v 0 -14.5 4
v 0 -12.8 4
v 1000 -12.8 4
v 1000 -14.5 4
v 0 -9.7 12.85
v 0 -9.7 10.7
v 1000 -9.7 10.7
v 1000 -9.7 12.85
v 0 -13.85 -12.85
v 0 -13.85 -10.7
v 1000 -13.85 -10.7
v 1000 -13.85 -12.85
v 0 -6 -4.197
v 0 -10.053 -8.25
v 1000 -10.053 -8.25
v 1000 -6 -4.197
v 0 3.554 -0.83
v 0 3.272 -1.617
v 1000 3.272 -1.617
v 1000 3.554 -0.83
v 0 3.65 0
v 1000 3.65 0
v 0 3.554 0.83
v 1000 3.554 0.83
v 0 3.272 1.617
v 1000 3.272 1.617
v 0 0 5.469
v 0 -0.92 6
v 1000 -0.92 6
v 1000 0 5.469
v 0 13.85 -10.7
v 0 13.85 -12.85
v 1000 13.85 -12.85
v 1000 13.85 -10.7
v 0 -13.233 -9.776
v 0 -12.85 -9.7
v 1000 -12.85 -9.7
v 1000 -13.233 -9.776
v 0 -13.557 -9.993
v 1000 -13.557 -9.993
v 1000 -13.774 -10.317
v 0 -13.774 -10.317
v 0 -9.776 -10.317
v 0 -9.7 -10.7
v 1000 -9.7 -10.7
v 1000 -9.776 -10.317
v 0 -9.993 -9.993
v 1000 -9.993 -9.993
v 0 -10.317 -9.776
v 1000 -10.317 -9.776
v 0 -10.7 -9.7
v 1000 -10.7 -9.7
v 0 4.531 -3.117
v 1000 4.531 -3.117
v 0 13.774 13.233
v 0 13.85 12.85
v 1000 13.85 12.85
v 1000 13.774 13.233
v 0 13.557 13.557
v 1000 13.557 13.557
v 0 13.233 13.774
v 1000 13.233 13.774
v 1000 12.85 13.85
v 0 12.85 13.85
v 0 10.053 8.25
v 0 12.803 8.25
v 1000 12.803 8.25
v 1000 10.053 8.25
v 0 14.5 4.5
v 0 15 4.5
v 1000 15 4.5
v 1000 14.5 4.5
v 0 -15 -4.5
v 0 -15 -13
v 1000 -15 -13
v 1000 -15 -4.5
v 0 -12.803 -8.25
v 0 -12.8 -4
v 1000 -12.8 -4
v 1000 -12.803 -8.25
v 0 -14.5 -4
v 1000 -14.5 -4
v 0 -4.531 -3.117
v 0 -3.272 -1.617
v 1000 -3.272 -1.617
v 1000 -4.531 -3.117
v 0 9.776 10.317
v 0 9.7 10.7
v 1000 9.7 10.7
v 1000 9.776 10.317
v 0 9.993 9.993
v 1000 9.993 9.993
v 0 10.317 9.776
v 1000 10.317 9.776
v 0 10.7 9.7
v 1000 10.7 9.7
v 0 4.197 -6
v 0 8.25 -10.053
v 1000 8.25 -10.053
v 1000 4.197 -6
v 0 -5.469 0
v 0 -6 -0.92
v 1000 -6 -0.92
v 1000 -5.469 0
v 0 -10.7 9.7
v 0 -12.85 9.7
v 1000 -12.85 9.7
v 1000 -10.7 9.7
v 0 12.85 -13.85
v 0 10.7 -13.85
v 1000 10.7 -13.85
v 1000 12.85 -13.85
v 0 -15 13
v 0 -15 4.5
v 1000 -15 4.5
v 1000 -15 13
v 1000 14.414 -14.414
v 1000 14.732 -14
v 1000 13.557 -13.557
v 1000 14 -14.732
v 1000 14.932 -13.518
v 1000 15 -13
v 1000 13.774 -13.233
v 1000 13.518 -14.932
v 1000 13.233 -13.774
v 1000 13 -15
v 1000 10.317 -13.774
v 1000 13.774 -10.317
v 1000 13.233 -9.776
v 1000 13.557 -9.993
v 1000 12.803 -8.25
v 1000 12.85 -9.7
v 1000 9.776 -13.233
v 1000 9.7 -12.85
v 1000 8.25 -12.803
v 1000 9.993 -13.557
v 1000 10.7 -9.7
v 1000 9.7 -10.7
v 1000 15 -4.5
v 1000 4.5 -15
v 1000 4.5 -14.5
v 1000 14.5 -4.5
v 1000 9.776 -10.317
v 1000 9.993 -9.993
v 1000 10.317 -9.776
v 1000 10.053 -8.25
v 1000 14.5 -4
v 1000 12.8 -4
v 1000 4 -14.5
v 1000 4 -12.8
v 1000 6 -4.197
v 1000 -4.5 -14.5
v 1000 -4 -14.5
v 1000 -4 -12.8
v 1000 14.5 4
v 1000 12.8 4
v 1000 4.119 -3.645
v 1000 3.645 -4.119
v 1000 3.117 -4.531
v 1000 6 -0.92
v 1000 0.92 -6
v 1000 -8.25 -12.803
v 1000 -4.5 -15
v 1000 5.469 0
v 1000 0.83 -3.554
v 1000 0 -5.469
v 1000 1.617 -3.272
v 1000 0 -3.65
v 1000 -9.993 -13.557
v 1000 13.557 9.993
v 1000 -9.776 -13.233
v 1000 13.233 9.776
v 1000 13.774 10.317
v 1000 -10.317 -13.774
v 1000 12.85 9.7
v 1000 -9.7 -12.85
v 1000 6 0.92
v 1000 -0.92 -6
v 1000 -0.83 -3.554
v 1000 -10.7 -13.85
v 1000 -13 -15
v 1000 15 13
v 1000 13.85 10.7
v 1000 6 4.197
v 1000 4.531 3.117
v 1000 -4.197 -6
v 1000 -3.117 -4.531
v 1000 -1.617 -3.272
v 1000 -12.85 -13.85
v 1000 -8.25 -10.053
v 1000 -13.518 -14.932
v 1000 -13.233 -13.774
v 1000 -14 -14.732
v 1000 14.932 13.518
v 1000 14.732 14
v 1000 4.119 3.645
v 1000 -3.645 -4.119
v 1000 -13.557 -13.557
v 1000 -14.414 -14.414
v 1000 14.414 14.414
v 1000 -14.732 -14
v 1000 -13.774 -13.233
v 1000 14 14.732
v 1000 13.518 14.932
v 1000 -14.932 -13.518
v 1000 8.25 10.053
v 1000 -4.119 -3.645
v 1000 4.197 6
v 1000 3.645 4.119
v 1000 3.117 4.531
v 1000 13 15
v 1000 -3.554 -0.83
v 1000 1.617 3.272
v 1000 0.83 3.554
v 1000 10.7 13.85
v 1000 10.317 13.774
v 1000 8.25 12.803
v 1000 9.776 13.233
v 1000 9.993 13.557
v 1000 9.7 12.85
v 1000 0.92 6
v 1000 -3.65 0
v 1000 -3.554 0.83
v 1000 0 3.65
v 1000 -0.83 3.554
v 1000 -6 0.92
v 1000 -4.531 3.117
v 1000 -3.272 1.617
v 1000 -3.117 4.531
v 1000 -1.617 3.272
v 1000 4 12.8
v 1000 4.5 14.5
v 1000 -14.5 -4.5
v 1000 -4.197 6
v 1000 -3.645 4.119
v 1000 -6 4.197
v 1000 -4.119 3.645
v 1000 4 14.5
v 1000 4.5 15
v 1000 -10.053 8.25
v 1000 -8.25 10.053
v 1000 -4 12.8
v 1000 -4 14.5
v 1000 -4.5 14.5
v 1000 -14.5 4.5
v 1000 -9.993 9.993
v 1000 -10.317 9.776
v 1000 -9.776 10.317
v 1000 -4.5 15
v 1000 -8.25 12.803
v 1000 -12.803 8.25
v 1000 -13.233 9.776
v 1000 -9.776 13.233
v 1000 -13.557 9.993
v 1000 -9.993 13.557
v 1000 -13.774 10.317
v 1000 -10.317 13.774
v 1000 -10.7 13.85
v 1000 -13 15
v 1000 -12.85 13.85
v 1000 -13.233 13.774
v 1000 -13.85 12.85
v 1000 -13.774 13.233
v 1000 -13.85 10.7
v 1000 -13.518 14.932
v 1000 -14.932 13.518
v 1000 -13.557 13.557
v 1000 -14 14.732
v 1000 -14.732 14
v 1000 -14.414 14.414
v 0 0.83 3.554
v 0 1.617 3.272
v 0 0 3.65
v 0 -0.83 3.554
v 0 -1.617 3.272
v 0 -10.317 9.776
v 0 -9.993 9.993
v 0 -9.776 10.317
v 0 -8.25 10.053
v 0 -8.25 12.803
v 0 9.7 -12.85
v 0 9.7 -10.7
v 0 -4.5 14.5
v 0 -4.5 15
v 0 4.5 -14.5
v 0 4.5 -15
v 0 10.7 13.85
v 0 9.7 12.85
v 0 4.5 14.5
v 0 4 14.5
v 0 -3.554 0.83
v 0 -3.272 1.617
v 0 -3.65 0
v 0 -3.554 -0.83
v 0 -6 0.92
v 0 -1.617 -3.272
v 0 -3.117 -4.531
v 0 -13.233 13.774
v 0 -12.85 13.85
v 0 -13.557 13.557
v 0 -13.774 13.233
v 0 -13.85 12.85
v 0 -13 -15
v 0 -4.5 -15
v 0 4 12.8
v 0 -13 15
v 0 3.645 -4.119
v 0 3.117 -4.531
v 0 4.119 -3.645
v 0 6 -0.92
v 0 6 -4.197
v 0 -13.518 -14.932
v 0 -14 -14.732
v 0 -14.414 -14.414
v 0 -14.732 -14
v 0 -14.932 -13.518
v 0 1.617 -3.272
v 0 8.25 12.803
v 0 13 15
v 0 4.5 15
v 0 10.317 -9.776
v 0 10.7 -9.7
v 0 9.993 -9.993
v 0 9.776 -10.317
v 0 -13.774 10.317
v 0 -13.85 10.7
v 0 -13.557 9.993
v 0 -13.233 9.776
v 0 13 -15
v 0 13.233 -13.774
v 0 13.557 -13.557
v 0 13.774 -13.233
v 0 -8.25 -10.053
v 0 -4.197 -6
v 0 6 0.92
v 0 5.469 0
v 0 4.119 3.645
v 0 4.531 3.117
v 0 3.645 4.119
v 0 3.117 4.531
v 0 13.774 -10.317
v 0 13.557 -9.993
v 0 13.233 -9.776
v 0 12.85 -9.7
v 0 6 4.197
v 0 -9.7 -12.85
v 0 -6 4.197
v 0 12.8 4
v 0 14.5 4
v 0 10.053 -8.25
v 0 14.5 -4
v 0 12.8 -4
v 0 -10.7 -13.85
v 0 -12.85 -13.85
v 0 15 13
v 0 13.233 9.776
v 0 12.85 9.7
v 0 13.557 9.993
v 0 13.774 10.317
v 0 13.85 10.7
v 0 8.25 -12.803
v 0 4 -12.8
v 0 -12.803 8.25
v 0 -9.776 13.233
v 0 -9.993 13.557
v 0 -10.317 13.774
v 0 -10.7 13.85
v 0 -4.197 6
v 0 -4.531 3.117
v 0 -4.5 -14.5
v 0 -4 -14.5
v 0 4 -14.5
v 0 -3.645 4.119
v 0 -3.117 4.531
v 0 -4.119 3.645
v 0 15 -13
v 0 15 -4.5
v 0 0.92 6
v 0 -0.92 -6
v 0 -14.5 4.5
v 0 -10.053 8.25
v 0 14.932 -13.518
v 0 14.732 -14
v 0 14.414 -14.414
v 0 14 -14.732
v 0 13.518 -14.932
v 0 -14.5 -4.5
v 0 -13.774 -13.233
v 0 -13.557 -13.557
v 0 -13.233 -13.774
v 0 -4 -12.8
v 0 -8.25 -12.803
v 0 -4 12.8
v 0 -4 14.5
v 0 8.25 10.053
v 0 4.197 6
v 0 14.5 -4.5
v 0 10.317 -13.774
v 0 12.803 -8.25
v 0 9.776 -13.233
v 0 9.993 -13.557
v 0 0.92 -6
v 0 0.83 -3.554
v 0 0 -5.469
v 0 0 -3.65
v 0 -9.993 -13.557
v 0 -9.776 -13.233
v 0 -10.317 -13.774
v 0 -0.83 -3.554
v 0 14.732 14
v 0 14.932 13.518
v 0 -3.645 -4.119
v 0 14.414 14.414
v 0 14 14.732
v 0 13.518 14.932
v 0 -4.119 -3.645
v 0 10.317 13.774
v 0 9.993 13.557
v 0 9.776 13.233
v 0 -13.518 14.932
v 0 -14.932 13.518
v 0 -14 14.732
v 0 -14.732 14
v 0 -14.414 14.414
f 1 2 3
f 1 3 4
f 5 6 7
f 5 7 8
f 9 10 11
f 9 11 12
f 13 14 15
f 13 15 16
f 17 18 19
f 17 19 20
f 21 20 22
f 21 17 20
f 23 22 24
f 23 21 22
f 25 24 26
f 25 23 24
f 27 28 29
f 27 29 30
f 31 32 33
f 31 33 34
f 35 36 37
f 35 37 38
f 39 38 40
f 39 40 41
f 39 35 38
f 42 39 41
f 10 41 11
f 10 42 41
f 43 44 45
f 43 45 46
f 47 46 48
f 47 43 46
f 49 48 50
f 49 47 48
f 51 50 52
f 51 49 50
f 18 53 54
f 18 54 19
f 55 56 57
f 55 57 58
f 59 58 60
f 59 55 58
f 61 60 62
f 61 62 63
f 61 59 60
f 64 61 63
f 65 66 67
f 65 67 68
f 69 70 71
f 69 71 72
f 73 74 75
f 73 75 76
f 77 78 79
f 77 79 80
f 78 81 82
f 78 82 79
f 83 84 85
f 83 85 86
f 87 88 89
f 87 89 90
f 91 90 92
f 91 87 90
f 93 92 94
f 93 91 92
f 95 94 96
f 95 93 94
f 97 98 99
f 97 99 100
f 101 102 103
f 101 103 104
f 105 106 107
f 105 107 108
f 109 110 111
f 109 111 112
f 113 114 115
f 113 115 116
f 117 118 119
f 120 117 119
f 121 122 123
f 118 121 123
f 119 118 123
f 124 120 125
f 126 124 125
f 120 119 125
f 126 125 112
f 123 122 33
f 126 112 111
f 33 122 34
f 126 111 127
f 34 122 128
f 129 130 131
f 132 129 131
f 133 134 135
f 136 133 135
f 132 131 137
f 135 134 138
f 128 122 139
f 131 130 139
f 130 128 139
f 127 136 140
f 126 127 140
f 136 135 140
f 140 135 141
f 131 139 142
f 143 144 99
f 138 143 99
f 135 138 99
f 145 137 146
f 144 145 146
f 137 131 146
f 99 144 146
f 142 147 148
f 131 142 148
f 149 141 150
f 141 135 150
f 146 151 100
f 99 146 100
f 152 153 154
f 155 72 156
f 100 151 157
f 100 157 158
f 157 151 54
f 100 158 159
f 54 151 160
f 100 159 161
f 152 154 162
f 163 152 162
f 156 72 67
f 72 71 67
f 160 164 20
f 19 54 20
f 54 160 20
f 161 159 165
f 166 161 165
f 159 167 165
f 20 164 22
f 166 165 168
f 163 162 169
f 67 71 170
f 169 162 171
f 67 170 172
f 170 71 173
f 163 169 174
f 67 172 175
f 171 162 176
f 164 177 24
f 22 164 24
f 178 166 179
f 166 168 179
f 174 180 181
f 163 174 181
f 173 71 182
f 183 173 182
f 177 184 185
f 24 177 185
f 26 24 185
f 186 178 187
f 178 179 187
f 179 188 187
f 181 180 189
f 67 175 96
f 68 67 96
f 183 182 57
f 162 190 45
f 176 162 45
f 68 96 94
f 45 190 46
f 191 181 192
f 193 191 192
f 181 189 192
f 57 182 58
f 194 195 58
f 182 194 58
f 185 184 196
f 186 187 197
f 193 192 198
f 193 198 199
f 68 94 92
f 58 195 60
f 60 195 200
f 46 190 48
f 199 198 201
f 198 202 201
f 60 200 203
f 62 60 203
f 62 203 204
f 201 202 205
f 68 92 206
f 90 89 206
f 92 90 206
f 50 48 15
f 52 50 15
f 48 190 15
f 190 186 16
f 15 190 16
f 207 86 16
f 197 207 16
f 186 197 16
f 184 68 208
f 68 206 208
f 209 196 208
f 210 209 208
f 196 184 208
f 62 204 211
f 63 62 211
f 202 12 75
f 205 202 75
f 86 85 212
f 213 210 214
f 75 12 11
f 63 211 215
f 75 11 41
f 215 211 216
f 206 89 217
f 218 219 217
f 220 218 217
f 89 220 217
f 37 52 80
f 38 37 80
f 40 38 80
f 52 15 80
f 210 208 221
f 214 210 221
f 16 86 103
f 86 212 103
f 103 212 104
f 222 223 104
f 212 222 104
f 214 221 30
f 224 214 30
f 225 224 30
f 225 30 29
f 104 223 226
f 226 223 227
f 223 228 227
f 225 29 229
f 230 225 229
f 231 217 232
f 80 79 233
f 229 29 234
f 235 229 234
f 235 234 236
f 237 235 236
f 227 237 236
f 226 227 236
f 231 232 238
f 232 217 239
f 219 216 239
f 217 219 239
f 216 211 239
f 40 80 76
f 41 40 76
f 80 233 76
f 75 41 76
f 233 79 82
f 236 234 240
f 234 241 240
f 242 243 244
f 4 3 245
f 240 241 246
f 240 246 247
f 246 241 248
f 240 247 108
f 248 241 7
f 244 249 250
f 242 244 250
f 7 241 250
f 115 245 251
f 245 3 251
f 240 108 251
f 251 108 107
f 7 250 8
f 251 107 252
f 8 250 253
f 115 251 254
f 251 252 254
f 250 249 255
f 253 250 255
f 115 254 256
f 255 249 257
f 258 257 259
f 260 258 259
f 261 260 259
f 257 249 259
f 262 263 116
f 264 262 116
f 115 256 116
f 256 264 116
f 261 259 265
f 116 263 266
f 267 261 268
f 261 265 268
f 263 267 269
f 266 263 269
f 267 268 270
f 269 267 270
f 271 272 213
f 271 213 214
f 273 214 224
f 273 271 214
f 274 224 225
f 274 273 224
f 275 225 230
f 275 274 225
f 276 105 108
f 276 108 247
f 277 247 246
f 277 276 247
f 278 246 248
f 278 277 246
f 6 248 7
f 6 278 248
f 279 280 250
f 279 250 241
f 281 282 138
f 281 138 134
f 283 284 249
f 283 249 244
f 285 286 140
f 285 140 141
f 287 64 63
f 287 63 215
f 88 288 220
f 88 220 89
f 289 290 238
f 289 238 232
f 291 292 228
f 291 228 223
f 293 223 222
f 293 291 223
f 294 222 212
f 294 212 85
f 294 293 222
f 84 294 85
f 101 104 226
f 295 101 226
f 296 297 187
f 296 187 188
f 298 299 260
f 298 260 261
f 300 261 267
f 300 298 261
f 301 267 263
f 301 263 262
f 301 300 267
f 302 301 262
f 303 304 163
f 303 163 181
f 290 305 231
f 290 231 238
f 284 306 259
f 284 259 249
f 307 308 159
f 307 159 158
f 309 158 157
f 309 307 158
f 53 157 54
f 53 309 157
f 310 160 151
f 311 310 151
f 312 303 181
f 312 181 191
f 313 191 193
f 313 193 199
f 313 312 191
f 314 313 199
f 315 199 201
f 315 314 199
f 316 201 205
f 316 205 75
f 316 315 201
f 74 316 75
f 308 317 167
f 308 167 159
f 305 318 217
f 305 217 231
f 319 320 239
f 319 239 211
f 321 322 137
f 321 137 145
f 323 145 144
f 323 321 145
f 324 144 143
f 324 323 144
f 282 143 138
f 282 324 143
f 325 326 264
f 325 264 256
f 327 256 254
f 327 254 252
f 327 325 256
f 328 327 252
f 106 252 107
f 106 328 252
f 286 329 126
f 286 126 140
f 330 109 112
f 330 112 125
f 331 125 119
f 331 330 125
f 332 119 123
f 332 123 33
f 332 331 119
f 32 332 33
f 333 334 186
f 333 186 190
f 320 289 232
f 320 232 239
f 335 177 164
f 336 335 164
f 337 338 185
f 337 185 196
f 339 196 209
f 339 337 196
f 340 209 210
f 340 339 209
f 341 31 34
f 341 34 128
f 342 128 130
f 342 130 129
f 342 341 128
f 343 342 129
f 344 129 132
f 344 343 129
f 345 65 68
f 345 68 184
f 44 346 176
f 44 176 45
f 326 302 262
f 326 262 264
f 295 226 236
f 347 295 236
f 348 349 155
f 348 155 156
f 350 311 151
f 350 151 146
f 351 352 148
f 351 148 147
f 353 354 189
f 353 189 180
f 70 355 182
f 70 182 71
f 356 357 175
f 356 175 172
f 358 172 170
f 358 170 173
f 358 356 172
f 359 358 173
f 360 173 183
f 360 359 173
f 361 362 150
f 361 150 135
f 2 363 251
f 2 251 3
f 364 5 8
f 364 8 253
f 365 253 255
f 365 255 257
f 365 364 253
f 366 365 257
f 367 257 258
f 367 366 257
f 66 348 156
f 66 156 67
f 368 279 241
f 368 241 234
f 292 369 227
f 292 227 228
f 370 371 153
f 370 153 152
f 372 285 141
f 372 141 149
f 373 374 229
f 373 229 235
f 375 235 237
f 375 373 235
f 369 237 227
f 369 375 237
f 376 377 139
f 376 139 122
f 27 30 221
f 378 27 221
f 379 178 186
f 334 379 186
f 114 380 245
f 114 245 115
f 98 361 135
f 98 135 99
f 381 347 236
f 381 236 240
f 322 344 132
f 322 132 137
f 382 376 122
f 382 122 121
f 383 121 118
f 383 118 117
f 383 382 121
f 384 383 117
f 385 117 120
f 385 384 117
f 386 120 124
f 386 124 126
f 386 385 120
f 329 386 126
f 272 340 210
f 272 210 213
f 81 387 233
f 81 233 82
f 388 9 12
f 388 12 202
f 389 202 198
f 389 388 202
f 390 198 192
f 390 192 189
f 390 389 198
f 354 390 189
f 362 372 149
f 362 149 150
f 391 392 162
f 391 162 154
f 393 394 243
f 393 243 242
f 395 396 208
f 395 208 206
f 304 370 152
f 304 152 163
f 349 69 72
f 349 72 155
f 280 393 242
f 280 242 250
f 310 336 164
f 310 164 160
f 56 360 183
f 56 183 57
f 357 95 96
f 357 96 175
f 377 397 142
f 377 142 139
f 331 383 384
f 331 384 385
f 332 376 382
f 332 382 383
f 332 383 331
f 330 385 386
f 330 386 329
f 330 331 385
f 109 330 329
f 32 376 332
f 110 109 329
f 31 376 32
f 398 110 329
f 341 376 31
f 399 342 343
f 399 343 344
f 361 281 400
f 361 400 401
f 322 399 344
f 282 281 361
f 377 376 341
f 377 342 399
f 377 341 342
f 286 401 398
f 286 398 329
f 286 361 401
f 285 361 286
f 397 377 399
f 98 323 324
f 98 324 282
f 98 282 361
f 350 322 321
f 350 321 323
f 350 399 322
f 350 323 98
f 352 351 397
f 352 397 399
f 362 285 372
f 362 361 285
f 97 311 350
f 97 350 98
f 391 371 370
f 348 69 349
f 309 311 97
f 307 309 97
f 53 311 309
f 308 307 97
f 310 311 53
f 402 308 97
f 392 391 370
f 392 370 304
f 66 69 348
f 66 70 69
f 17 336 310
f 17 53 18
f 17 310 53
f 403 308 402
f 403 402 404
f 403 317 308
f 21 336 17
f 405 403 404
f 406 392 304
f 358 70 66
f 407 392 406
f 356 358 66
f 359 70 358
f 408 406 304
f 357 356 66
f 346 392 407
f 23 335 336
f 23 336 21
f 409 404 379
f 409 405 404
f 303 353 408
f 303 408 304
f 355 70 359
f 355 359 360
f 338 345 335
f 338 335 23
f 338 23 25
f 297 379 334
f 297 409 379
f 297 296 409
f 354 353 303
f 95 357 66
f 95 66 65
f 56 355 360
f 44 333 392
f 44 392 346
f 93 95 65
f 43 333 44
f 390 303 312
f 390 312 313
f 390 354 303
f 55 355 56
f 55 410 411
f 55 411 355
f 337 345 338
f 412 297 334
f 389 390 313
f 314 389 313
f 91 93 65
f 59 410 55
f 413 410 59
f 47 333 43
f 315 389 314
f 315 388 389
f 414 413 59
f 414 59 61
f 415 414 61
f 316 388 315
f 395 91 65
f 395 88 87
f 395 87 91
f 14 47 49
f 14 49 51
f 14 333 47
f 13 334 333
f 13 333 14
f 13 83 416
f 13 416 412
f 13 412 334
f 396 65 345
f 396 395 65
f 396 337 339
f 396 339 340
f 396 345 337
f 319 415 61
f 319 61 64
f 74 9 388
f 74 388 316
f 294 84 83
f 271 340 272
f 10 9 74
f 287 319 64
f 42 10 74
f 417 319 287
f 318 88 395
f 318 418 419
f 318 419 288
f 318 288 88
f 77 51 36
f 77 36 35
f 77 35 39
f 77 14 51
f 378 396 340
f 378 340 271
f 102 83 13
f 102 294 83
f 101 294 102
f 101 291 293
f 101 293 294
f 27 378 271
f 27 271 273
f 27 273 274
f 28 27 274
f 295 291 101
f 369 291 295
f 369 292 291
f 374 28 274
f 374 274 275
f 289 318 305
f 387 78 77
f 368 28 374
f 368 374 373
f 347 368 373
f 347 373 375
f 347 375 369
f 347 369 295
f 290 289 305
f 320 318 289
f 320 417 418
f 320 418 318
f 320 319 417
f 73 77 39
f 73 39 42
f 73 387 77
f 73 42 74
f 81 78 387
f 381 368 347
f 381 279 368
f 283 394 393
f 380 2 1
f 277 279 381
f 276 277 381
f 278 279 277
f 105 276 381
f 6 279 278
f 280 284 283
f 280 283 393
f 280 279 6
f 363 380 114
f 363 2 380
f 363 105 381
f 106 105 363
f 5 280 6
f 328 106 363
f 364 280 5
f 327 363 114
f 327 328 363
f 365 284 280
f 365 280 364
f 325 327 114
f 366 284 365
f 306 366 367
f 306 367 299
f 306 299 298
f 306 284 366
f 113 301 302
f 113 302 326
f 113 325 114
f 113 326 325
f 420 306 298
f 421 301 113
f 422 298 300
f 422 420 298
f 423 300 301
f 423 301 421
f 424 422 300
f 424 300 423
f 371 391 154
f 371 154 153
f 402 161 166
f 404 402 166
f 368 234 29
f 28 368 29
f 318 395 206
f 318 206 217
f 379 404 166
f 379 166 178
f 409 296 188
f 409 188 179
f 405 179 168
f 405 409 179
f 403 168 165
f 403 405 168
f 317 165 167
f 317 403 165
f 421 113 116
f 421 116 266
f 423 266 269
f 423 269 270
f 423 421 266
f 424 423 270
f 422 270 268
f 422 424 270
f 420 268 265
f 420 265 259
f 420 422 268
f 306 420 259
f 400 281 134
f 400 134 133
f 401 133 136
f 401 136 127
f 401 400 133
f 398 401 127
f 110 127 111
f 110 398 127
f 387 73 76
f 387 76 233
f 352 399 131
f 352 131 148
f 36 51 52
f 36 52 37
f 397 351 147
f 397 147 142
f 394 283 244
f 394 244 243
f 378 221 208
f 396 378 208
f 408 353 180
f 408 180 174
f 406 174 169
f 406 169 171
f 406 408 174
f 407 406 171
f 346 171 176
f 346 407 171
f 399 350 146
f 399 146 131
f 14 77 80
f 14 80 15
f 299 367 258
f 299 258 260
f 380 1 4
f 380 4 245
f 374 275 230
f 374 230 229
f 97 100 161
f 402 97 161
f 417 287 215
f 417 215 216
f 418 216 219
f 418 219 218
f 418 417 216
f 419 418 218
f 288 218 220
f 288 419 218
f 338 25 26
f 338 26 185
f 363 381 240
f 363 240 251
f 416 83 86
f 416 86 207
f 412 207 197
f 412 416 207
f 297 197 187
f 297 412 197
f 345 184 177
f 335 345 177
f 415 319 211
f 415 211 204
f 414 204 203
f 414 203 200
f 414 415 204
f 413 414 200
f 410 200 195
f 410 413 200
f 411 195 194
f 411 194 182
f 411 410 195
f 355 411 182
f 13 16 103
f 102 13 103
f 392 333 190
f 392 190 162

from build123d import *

# Parameters (mm, degrees)
ESTRUSIONE_ESTRUSIONE1_DEPTH = 1000


with BuildPart() as part:
    # Schizzo1 → Estrusione-Estrusione1 (new body)
    with BuildSketch(Plane(origin=(0, 0, 0), x_dir=(0, -1, 0), z_dir=(-1, 0, 0))):
        with BuildLine():
            Line((-10.05312229, 8.25), (-6, 4.19687771))
            Line((-6, 4.19687771), (-6, 0.91961524))
            Line((-6, 0.91961524), (-5.469059893, -2e-09))
            Line((-5.469059893, -2e-09), (-6, -0.91961524))
            Line((-6, -0.91961524), (-6, -4.19687771))
            Line((-6, -4.19687771), (-10.05312229, -8.25))
            Line((-10.05312229, -8.25), (-12.80312305, -8.25))
            Line((-12.80312305, -8.25), (-12.8, -4))
            Line((-12.8, -4), (-14.5, -4))
            Line((-14.5, -4), (-14.5, -4.5))
            Line((-14.5, -4.5), (-15, -4.5))
            Line((-15, -4.5), (-15, -13))
            ThreePointArc((-15, -13), (-14.414213562, -14.414213562), (-13, -15))
            Line((-13, -15), (-4.5, -15))
            Line((-4.5, -15), (-4.5, -14.5))
            Line((-4.5, -14.5), (-4, -14.5))
            Line((-4, -14.5), (-4, -12.8))
            Line((-4, -12.8), (-8.25, -12.80312305))
            Line((-8.25, -12.80312305), (-8.25, -10.05312229))
            Line((-8.25, -10.05312229), (-4.19687771, -6))
            Line((-4.19687771, -6), (-0.91961524, -6))
            Line((-0.91961524, -6), (2e-09, -5.469059893))
            Line((2e-09, -5.469059893), (0.91961524, -6))
            Line((0.91961524, -6), (4.19687771, -6))
            Line((4.19687771, -6), (8.25, -10.05312229))
            Line((8.25, -10.05312229), (8.25, -12.80312305))
            Line((8.25, -12.80312305), (4, -12.8))
            Line((4, -12.8), (4, -14.5))
            Line((4, -14.5), (4.5, -14.5))
            Line((4.5, -14.5), (4.5, -15))
            Line((4.5, -15), (13, -15))
            ThreePointArc((13, -15), (14.414213562, -14.414213562), (15, -13))
            Line((15, -13), (15, -4.5))
            Line((15, -4.5), (14.5, -4.5))
            Line((14.5, -4.5), (14.5, -4))
            Line((14.5, -4), (12.8, -4))
            Line((12.8, -4), (12.80312305, -8.25))
            Line((12.80312305, -8.25), (10.05312229, -8.25))
            Line((10.05312229, -8.25), (6, -4.19687771))
            Line((6, -4.19687771), (6, -0.91961524))
            Line((6, -0.91961524), (5.469059893, -2e-09))
            Line((5.469059893, -2e-09), (6, 0.91961524))
            Line((6, 0.91961524), (6, 4.19687771))
            Line((6, 4.19687771), (10.05312229, 8.25))
            Line((10.05312229, 8.25), (12.80312305, 8.25))
            Line((12.80312305, 8.25), (12.8, 4))
            Line((12.8, 4), (14.5, 4))
            Line((14.5, 4), (14.5, 4.5))
            Line((14.5, 4.5), (15, 4.5))
            Line((15, 4.5), (15, 13))
            ThreePointArc((15, 13), (14.414213562, 14.414213562), (13, 15))
            Line((13, 15), (4.5, 15))
            Line((4.5, 15), (4.5, 14.5))
            Line((4.5, 14.5), (4, 14.5))
            Line((4, 14.5), (4, 12.8))
            Line((4, 12.8), (8.25, 12.80312305))
            Line((8.25, 12.80312305), (8.25, 10.05312229))
            Line((8.25, 10.05312229), (4.19687771, 6))
            Line((4.19687771, 6), (0.91961524, 6))
            Line((0.91961524, 6), (2e-09, 5.469059893))
            Line((2e-09, 5.469059893), (-0.91961524, 6))
            Line((-0.91961524, 6), (-4.19687771, 6))
            Line((-4.19687771, 6), (-8.25, 10.05312229))
            Line((-8.25, 10.05312229), (-8.25, 12.80312305))
            Line((-8.25, 12.80312305), (-4, 12.8))
            Line((-4, 12.8), (-4, 14.5))
            Line((-4, 14.5), (-4.5, 14.5))
            Line((-4.5, 14.5), (-4.5, 15))
            Line((-4.5, 15), (-13, 15))
            ThreePointArc((-13, 15), (-14.414213562, 14.414213562), (-15, 13))
            Line((-15, 13), (-15, 4.5))
            Line((-15, 4.5), (-14.5, 4.5))
            Line((-14.5, 4.5), (-14.5, 4))
            Line((-14.5, 4), (-12.8, 4))
            Line((-12.8, 4), (-12.80312305, 8.25))
            Line((-12.80312305, 8.25), (-10.05312229, 8.25))
        make_face()
        with BuildLine():
            Line((-3.117157854, 4.531371416), (-1.616767222, 3.272394195))
            ThreePointArc((-1.616767222, 3.272394195), (5e-09, 3.650000002), (1.616767231, 3.272394191))
            Line((1.616767231, 3.272394191), (3.117157862, 4.531371411))
            ThreePointArc((3.117157862, 4.531371411), (3.889087302, 3.889087292), (4.53137142, 3.11715785))
            Line((4.53137142, 3.11715785), (3.272394197, 1.616767219))
            ThreePointArc((3.272394197, 1.616767219), (3.650000003, -4e-09), (3.272394193, -1.616767225))
            Line((3.272394193, -1.616767225), (4.531371415, -3.117157856))
            ThreePointArc((4.531371415, -3.117157856), (3.889087297, -3.889087296), (3.117157857, -4.531371414))
            Line((3.117157857, -4.531371414), (1.616767227, -3.272394192))
            ThreePointArc((1.616767227, -3.272394192), (5e-09, -3.650000002), (-1.616767217, -3.272394197))
            Line((-1.616767217, -3.272394197), (-3.117157849, -4.531371419))
            ThreePointArc((-3.117157849, -4.531371419), (-3.889087291, -3.889087301), (-4.531371411, -3.117157861))
            Line((-4.531371411, -3.117157861), (-3.27239419, -1.61676723))
            ThreePointArc((-3.27239419, -1.61676723), (-3.650000002, -5e-09), (-3.272394194, 1.616767222))
            Line((-3.272394194, 1.616767222), (-4.531371416, 3.117157855))
            ThreePointArc((-4.531371416, 3.117157855), (-3.889087296, 3.889087297), (-3.117157854, 4.531371416))
        make_face(mode=Mode.SUBTRACT)
        with BuildLine():
            Line((12.85, 9.7), (10.7, 9.7))
            ThreePointArc((10.7, 9.7), (9.992893219, 9.992893219), (9.7, 10.7))
            Line((9.7, 10.7), (9.7, 12.85))
            ThreePointArc((9.7, 12.85), (9.992893219, 13.557106781), (10.7, 13.85))
            Line((10.7, 13.85), (12.85, 13.85))
            ThreePointArc((12.85, 13.85), (13.557106781, 13.557106781), (13.85, 12.85))
            Line((13.85, 12.85), (13.85, 10.7))
            ThreePointArc((13.85, 10.7), (13.557106781, 9.992893219), (12.85, 9.7))
        make_face(mode=Mode.SUBTRACT)
        with BuildLine():
            Line((-9.7, 12.85), (-9.7, 10.7))
            ThreePointArc((-9.7, 10.7), (-9.992893219, 9.992893219), (-10.7, 9.7))
            Line((-10.7, 9.7), (-12.85, 9.7))
            ThreePointArc((-12.85, 9.7), (-13.557106781, 9.992893219), (-13.85, 10.7))
            Line((-13.85, 10.7), (-13.85, 12.85))
            ThreePointArc((-13.85, 12.85), (-13.557106781, 13.557106781), (-12.85, 13.85))
            Line((-12.85, 13.85), (-10.7, 13.85))
            ThreePointArc((-10.7, 13.85), (-9.992893219, 13.557106781), (-9.7, 12.85))
        make_face(mode=Mode.SUBTRACT)
        with BuildLine():
            Line((-12.85, -9.7), (-10.7, -9.7))
            ThreePointArc((-10.7, -9.7), (-9.992893219, -9.992893219), (-9.7, -10.7))
            Line((-9.7, -10.7), (-9.7, -12.85))
            ThreePointArc((-9.7, -12.85), (-9.992893219, -13.557106781), (-10.7, -13.85))
            Line((-10.7, -13.85), (-12.85, -13.85))
            ThreePointArc((-12.85, -13.85), (-13.557106781, -13.557106781), (-13.85, -12.85))
            Line((-13.85, -12.85), (-13.85, -10.7))
            ThreePointArc((-13.85, -10.7), (-13.557106781, -9.992893219), (-12.85, -9.7))
        make_face(mode=Mode.SUBTRACT)
        with BuildLine():
            Line((9.7, -12.85), (9.7, -10.7))
            ThreePointArc((9.7, -10.7), (9.992893219, -9.992893219), (10.7, -9.7))
            Line((10.7, -9.7), (12.85, -9.7))
            ThreePointArc((12.85, -9.7), (13.557106781, -9.992893219), (13.85, -10.7))
            Line((13.85, -10.7), (13.85, -12.85))
            ThreePointArc((13.85, -12.85), (13.557106781, -13.557106781), (12.85, -13.85))
            Line((12.85, -13.85), (10.7, -13.85))
            ThreePointArc((10.7, -13.85), (9.992893219, -13.557106781), (9.7, -12.85))
        make_face(mode=Mode.SUBTRACT)
    extrude(amount=-ESTRUSIONE_ESTRUSIONE1_DEPTH)


solid = part.part
